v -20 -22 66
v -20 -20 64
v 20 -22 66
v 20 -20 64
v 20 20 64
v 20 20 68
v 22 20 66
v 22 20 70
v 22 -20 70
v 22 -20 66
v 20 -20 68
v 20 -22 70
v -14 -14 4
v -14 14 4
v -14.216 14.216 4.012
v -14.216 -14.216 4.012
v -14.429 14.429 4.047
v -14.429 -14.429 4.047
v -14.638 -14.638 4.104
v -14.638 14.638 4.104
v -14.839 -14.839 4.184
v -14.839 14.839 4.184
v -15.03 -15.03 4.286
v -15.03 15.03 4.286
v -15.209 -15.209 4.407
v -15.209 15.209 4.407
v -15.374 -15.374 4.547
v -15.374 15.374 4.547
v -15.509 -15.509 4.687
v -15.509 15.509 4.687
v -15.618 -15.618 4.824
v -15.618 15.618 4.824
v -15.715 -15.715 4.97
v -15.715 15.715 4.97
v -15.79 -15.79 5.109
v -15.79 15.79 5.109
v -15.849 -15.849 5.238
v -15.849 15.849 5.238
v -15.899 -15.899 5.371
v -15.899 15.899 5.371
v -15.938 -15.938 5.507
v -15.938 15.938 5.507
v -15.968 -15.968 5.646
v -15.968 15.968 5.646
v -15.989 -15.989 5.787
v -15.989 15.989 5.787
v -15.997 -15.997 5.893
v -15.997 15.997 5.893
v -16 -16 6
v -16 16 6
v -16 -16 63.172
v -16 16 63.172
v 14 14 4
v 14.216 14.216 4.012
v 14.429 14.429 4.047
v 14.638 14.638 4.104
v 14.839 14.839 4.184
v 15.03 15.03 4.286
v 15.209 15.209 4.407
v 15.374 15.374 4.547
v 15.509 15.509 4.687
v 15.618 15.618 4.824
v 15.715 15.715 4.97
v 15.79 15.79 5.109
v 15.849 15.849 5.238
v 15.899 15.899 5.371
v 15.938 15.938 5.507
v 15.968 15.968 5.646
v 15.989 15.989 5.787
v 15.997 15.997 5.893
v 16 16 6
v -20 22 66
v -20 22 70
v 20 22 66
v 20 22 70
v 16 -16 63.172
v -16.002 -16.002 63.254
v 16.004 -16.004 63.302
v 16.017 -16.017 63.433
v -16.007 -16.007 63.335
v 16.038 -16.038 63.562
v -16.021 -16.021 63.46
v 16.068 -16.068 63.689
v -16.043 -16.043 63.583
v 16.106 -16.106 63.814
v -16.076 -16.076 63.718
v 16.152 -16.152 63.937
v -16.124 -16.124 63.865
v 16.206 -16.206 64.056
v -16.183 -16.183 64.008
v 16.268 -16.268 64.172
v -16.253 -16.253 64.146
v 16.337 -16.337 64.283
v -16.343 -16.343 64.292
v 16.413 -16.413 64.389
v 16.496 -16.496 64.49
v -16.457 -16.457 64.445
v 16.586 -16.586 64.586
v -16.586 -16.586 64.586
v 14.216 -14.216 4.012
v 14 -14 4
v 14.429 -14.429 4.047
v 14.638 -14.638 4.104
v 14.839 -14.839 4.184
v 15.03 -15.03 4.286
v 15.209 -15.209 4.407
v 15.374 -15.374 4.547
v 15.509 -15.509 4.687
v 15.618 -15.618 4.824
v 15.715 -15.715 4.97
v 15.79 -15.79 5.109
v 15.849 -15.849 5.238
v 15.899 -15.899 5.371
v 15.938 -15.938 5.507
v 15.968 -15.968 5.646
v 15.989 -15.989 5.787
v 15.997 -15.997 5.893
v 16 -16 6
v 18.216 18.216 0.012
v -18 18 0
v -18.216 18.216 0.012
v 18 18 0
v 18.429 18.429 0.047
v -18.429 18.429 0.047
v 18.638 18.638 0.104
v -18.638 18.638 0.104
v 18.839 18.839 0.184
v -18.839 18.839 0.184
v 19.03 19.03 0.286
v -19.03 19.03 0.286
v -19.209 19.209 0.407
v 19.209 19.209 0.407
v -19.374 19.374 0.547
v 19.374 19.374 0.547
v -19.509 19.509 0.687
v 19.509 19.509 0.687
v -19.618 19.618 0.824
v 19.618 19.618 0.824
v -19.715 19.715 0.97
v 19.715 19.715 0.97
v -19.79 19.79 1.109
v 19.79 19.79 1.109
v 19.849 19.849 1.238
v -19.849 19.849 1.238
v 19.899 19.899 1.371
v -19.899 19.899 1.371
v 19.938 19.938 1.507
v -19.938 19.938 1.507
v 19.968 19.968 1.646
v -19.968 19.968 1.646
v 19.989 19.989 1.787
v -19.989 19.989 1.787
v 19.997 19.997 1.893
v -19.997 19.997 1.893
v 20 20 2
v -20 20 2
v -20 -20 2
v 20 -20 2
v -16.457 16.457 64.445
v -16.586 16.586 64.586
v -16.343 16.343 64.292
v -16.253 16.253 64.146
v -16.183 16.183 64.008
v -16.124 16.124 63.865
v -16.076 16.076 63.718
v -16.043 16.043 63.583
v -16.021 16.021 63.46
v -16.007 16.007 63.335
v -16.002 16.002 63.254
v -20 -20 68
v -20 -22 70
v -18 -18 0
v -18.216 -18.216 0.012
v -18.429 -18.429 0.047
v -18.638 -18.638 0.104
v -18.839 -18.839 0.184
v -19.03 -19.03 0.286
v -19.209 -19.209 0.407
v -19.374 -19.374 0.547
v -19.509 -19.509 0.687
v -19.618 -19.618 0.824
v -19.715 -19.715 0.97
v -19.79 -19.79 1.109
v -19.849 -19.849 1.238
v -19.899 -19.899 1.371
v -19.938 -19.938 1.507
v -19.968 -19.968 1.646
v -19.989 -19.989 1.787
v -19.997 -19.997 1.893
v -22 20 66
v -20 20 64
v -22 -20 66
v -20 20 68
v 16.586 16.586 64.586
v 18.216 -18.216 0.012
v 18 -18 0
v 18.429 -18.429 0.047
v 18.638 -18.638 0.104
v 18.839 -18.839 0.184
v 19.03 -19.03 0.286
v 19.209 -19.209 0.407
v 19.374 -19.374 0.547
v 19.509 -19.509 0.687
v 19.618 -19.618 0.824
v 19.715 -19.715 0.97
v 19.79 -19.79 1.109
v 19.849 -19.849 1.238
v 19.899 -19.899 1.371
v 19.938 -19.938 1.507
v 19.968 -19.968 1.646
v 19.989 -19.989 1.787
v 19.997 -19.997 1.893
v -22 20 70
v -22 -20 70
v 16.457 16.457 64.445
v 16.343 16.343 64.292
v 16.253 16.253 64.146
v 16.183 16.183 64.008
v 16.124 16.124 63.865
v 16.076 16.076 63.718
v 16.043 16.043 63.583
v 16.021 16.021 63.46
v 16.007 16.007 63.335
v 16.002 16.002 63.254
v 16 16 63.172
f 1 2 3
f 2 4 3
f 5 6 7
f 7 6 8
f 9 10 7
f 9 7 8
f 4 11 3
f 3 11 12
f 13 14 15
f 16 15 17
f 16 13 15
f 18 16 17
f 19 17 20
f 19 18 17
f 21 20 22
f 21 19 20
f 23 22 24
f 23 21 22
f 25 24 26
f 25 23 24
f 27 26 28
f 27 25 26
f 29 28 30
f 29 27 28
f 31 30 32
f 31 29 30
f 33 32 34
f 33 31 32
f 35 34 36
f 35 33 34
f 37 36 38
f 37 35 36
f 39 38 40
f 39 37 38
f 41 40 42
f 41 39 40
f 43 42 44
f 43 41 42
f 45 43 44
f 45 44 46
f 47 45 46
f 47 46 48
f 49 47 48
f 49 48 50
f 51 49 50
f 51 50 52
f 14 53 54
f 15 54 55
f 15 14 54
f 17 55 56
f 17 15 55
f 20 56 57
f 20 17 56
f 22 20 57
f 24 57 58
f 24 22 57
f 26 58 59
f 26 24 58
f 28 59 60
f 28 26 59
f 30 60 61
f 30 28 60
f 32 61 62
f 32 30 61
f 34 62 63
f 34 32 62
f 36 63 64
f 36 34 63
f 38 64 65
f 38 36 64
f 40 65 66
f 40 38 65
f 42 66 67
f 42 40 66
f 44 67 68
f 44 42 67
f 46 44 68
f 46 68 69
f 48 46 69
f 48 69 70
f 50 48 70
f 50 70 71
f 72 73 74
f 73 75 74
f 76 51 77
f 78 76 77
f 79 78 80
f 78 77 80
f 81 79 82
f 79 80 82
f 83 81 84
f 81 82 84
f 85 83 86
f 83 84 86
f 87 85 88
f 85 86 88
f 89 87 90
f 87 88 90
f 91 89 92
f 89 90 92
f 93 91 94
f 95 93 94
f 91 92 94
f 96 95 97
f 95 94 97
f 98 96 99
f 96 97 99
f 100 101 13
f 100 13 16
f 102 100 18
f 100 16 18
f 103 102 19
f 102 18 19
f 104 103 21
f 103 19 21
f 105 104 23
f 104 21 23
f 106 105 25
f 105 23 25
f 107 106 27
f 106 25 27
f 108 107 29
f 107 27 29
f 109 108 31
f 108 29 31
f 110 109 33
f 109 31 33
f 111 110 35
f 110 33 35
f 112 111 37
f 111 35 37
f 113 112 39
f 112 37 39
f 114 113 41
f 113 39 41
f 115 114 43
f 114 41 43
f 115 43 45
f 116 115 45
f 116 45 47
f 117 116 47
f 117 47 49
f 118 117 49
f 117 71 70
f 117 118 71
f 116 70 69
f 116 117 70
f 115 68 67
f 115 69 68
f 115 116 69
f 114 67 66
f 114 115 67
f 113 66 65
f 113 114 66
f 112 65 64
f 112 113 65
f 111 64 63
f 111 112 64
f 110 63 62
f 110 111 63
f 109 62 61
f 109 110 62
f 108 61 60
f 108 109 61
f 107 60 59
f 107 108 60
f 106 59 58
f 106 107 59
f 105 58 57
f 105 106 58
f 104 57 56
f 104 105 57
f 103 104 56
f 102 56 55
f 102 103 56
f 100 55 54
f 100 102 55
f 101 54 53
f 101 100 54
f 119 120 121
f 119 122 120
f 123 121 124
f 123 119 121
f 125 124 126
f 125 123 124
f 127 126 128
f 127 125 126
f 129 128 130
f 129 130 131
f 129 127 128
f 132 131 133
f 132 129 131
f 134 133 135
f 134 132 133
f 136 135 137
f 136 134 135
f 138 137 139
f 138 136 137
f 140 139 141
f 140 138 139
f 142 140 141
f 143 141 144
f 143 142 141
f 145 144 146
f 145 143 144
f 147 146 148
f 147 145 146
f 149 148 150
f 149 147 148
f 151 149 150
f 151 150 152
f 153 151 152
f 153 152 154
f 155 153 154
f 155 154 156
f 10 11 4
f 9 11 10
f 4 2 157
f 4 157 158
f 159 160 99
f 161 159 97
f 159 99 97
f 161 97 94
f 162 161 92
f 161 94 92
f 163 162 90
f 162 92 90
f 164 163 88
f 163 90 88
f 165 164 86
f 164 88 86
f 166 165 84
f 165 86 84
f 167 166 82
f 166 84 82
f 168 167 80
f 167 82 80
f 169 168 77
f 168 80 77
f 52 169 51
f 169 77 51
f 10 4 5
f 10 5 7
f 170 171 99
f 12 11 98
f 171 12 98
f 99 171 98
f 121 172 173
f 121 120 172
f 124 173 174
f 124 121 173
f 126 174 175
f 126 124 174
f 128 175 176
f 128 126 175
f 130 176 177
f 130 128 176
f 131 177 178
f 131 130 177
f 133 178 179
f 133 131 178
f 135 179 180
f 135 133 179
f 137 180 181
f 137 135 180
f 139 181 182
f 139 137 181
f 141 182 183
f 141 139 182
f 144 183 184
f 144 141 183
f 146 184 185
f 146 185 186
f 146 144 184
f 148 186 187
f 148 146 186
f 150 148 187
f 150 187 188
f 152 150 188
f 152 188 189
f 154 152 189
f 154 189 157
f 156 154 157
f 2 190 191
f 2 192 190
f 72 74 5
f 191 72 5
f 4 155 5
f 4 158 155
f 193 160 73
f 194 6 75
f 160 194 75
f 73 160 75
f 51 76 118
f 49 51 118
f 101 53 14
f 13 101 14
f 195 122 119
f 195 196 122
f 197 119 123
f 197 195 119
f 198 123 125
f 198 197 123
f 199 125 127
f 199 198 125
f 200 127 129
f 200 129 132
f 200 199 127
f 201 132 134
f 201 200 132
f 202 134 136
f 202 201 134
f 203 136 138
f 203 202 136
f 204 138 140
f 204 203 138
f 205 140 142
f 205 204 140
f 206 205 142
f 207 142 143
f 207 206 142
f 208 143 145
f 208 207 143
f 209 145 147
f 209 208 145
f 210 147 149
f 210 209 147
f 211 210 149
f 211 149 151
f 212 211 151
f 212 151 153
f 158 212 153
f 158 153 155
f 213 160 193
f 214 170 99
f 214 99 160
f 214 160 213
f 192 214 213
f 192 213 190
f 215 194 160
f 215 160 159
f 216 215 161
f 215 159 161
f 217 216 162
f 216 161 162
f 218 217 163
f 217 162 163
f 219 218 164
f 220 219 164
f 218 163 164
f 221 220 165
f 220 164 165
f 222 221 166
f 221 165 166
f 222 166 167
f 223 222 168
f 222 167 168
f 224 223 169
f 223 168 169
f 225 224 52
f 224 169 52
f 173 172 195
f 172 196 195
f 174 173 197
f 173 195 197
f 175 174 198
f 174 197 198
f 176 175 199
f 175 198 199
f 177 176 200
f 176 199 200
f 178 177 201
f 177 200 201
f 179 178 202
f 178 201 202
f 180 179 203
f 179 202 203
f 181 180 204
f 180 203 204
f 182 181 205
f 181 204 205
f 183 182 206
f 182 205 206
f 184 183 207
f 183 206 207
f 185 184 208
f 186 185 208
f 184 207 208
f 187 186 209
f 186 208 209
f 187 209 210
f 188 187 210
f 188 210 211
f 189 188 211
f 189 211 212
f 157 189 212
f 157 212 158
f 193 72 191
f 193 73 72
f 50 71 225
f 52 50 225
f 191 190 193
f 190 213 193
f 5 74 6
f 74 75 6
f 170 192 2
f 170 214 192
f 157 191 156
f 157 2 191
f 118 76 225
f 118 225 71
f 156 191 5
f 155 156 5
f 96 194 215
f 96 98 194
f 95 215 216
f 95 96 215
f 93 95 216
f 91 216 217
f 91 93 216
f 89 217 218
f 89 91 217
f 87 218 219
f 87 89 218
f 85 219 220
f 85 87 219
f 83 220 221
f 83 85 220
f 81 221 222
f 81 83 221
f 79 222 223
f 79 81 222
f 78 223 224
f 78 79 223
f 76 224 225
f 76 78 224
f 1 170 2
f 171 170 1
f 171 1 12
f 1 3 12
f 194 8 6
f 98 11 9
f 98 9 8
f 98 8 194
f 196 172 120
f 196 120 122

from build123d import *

# Parameters (mm, degrees)
EXTRUDE003_DEPTH = 20
EXTRUDE002_DEPTH = 20
FILLET_R         = 2


with BuildPart() as extrude003:
    # Sketch004 (on Extrude) → Extrude003 (new body, symmetric)
    with BuildSketch(Plane.YZ):
        Polygon((20, 0), (-20, 0), (-20, 64), (-22, 66), (-22, 70), (-16, 64), (-16, 4), (16, 4), (16, 64), (22, 70), (22, 66), (20, 64), align=None)
    extrude(amount=EXTRUDE003_DEPTH, both=True)


with BuildPart() as bin:
    # Sketch003 → Extrude002 (new body, symmetric)
    with BuildSketch(Plane.XZ):
        Polygon((-20, 0), (20, 0), (20, 64), (22, 66), (22, 70), (16, 64), (16, 4), (-16, 4), (-16, 64), (-22, 70), (-22, 66), (-20, 64), align=None)
    extrude(amount=EXTRUDE002_DEPTH, both=True)

    # Fusion001: union Extrude003
    add(extrude003.part)

    # Fillet
    fillet_edges = [bin.edges().sort_by_distance(p)[0] for p in [
        (-20, 0, 0),
        (-16, 0, 64),
        (0, 20, 0),
        (20, 0, 0),
        (0, -20, 0),
        (0, 16, 64),
        (-16, 0, 4),
        (0, -16, 64),
        (0, 16, 4),
        (16, 0, 64),
        (0, -16, 4),
        (16, 0, 4),
    ]]
    fillet(fillet_edges, radius=FILLET_R)


solid = bin.part
